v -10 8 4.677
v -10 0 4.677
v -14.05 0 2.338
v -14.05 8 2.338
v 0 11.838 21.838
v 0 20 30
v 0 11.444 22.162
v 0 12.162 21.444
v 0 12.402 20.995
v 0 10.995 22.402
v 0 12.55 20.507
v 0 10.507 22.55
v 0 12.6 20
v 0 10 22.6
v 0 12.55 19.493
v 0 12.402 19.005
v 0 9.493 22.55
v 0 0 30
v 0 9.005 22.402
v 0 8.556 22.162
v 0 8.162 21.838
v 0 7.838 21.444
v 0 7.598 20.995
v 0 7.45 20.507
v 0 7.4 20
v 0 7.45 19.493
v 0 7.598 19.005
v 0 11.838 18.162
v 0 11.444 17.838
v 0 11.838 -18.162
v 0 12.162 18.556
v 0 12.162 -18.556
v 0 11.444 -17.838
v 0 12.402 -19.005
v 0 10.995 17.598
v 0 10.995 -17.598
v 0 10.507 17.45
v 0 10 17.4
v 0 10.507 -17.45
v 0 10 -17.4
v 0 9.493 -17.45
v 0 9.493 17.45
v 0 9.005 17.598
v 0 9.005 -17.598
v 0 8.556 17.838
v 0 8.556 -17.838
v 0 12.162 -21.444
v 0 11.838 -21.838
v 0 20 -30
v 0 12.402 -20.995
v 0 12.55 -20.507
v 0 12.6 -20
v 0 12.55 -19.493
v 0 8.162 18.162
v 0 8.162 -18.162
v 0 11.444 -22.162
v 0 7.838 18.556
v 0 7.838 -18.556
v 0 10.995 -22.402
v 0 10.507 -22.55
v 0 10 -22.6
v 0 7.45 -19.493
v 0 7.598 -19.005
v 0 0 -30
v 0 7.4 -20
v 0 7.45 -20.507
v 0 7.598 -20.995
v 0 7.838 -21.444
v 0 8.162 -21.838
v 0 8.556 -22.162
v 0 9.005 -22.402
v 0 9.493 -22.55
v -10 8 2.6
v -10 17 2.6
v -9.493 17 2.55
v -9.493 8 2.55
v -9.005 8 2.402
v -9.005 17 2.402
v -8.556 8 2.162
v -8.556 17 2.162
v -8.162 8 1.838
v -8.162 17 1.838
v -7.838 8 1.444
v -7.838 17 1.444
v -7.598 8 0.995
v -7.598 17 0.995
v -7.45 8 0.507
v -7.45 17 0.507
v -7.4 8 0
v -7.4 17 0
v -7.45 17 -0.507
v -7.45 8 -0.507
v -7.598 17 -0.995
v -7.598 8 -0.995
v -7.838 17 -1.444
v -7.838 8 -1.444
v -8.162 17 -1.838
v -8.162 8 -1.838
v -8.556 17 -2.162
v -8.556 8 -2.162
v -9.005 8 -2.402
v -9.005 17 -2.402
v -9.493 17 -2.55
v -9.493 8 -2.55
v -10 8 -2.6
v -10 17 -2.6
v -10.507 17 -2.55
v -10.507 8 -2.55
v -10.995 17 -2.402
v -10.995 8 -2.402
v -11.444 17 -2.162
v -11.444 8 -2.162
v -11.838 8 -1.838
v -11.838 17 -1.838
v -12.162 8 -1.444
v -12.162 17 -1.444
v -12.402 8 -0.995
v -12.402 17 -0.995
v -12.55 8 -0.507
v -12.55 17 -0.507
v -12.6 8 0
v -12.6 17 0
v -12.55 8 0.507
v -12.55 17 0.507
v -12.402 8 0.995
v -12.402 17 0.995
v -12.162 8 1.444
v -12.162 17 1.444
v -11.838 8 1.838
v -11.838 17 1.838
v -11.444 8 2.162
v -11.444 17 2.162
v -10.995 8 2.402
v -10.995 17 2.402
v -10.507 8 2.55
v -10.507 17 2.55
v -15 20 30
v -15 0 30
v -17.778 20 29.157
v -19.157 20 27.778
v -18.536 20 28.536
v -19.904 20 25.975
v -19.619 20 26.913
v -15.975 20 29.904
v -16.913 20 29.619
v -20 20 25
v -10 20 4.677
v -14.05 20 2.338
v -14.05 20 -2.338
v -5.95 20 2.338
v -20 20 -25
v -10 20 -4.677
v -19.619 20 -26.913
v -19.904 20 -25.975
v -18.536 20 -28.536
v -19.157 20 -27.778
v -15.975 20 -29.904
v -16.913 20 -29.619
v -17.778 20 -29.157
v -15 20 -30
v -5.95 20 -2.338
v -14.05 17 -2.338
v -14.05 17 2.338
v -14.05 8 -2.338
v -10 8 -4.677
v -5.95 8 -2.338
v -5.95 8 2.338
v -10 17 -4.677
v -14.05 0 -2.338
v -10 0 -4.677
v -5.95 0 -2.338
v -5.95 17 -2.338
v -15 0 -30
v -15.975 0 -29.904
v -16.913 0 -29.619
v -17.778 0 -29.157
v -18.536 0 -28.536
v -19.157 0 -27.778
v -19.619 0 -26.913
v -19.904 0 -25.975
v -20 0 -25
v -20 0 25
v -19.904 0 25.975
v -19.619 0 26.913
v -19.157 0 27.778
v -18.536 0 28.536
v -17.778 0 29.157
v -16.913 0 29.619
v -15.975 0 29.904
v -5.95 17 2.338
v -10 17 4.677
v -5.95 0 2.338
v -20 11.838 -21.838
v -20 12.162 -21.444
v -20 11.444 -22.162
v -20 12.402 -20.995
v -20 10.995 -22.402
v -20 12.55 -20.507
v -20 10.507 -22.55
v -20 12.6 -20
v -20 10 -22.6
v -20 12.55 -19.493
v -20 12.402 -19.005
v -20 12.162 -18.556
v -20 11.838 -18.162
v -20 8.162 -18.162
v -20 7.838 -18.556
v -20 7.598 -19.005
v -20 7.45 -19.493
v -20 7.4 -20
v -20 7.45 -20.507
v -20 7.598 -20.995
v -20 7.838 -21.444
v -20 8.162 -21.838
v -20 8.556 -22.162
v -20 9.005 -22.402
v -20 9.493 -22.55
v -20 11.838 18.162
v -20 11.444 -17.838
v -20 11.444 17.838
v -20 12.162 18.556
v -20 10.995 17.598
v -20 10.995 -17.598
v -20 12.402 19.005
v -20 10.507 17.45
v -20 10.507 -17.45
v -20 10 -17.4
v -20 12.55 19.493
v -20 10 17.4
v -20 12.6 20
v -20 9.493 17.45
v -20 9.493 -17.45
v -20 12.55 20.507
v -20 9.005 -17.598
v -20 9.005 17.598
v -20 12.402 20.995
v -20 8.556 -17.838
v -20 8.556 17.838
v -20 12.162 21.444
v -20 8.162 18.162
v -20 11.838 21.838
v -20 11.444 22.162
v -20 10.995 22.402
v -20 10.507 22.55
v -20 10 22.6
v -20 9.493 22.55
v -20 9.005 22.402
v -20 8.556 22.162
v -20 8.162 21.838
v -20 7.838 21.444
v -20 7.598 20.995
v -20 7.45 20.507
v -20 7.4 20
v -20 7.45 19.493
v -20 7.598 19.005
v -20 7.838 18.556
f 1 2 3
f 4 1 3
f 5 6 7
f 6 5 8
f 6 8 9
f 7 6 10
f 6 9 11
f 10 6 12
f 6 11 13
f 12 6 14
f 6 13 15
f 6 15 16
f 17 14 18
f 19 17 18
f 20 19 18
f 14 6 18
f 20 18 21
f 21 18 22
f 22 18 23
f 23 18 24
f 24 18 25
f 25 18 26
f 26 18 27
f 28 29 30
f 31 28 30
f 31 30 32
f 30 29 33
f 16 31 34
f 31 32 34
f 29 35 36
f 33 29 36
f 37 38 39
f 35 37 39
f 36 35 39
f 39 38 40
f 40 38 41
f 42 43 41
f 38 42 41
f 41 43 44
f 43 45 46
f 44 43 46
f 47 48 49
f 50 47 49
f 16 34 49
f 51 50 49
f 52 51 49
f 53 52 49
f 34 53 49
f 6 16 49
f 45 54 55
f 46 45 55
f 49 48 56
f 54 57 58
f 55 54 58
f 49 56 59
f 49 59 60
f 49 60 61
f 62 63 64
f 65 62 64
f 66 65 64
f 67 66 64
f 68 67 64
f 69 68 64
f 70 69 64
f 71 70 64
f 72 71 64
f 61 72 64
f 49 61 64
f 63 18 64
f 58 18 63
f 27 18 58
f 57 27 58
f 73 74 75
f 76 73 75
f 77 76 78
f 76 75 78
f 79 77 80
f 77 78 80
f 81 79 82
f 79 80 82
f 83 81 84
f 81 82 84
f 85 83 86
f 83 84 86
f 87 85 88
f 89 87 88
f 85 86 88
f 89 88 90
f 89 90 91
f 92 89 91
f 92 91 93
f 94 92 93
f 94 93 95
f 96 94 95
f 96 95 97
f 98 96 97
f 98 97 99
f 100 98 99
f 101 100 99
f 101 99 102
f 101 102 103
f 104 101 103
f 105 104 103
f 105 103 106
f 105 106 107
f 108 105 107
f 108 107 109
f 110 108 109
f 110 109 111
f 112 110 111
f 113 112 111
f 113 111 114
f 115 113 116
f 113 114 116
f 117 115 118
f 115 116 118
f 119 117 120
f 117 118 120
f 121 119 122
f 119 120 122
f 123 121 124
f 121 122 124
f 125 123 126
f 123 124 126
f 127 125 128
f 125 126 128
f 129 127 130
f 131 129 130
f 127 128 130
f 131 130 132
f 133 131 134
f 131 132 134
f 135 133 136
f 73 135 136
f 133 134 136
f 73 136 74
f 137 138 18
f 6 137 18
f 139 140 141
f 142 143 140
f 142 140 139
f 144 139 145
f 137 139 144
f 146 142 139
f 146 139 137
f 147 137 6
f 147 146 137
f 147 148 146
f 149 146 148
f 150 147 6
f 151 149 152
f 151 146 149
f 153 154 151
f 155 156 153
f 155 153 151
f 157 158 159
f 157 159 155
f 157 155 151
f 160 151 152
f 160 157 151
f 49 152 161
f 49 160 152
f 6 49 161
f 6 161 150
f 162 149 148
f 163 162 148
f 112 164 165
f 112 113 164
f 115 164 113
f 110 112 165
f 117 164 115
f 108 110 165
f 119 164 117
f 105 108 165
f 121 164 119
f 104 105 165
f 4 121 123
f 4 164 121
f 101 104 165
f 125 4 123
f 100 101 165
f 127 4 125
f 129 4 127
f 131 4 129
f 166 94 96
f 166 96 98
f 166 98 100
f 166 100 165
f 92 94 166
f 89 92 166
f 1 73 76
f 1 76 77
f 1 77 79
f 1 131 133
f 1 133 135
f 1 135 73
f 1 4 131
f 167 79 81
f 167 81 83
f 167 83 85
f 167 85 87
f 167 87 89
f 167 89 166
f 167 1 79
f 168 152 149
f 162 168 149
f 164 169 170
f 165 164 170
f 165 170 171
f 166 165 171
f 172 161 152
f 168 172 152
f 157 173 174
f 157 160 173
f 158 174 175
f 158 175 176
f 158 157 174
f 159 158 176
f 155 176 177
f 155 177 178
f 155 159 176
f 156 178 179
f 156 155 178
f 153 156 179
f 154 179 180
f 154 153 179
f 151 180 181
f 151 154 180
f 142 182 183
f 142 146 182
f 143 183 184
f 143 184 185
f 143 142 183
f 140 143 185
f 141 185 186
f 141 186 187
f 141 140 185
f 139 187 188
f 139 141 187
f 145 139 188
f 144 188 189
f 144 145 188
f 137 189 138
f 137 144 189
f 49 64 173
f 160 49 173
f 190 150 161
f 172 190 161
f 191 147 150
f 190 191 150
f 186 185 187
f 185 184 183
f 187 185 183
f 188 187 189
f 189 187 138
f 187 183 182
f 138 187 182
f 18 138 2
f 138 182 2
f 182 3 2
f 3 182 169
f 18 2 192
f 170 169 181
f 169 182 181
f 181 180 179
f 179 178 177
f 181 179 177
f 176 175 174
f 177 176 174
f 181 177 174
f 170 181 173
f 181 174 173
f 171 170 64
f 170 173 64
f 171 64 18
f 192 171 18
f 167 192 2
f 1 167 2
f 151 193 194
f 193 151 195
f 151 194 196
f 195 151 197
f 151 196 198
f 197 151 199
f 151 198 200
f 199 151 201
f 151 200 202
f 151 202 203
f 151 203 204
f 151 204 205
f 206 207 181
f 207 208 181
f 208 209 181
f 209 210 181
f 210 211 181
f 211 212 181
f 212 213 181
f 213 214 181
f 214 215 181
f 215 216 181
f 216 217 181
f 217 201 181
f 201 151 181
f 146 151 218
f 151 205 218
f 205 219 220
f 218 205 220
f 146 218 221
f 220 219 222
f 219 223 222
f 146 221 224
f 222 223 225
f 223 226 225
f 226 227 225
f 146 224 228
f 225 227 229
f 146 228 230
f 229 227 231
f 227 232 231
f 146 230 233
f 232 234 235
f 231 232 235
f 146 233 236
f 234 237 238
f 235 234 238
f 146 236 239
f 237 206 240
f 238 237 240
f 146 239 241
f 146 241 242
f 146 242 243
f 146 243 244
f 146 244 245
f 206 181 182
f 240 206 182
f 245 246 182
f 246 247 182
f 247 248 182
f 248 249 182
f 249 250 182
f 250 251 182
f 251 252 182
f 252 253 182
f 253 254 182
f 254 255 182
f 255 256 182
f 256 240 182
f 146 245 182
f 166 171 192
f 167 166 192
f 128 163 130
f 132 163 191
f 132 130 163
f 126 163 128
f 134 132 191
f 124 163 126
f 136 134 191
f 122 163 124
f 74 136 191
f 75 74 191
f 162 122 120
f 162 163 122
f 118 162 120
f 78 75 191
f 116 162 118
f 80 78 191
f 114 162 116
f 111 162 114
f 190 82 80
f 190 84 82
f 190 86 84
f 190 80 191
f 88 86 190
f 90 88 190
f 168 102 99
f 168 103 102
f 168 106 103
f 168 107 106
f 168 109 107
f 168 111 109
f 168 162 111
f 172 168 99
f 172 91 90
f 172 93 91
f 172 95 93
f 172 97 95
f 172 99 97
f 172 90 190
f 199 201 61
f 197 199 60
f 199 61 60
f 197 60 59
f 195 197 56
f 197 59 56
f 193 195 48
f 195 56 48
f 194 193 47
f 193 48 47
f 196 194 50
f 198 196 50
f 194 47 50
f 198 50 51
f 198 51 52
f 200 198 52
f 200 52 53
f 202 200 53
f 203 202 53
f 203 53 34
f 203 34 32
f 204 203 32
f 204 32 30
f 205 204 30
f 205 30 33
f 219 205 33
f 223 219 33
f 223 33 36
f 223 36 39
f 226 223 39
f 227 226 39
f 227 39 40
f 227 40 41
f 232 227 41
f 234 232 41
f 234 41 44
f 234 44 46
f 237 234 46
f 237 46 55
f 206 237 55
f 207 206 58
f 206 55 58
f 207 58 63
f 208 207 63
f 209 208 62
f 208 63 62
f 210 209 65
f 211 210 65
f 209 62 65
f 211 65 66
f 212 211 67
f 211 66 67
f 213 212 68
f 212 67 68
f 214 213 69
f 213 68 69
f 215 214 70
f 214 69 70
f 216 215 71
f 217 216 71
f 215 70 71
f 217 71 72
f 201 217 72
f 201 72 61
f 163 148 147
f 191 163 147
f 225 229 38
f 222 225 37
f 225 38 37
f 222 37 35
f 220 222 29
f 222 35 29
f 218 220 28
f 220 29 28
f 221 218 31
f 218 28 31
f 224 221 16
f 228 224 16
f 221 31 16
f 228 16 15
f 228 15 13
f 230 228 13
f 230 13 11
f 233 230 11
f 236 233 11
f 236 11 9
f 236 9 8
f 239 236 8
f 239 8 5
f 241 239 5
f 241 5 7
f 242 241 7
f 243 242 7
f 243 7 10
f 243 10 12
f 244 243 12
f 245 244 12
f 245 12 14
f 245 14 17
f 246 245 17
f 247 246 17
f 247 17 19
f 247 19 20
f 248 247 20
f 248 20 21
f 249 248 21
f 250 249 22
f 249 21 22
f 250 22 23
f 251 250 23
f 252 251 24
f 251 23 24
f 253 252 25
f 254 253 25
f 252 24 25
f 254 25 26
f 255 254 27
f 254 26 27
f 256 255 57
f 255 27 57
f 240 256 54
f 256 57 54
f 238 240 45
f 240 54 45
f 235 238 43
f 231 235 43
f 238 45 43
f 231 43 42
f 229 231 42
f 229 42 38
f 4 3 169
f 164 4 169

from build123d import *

# Parameters (mm, degrees)
BOSS_EXTRUDE1_DEPTH = 20
SKETCH4_R           = 2.6
CUT_EXTRUDE1_DEPTH  = 42.231056256
CUT_EXTRUDE2_DEPTH  = 3
CUT_EXTRUDE3_DEPTH  = 8
SKETCH7_R           = 2.6
CUT_EXTRUDE4_DEPTH  = 42.231056256
FILLET1_R           = 5


with BuildPart() as part:
    # Sketch1 → Boss-Extrude1 (new body)
    with BuildSketch(Plane(origin=(0, 0, 0), x_dir=(1, 0, 0), z_dir=(0, 1, 0))):
        Polygon((0, 0), (0, 30), (-20, 30), (-20, -30), (0, -30), align=None)
    extrude(amount=BOSS_EXTRUDE1_DEPTH)

    # Sketch4 → Cut-Extrude1 (cut, through all)
    with BuildSketch(Plane(origin=(0, 20, 0), x_dir=(1, 0, 0), z_dir=(0, 1, 0))):
        with Locations(Location((-10, 0, 0), (0, 0, 270))):
            Circle(SKETCH4_R)
    extrude(amount=-CUT_EXTRUDE1_DEPTH, mode=Mode.SUBTRACT)

    # Sketch5 → Cut-Extrude2 (cut)
    with BuildSketch(Plane(origin=(0, 20, 0), x_dir=(1, 0, 0), z_dir=(0, 1, 0))):
        Polygon((-10, 4.67653718), (-14.05, 2.33826859), (-14.05, -2.33826859), (-10, -4.67653718), (-5.95, -2.33826859), (-5.95, 2.33826859), align=None)
    extrude(amount=-CUT_EXTRUDE2_DEPTH, mode=Mode.SUBTRACT)

    # Sketch6 → Cut-Extrude3 (cut)
    with BuildSketch(Plane.XZ):
        Polygon((-10, -4.67653718), (-5.95, -2.33826859), (-5.95, 2.33826859), (-10, 4.67653718), (-14.05, 2.33826859), (-14.05, -2.33826859), align=None)
    extrude(amount=-CUT_EXTRUDE3_DEPTH, mode=Mode.SUBTRACT)

    # Sketch7 → Cut-Extrude4 (cut, through all)
    with BuildSketch(Plane(origin=(0, 0, 0), x_dir=(0, 0, -1), z_dir=(1, 0, 0))):
        with Locations((-20, 10)):
            Circle(SKETCH7_R)
        with Locations((20, 10)):
            Circle(SKETCH7_R)
    extrude(amount=-CUT_EXTRUDE4_DEPTH, mode=Mode.SUBTRACT)

    # Fillet1
    fillet1_edges = [part.edges().sort_by_distance(p)[0] for p in [
        (-20, 10, 30),
        (-20, 10, -30),
    ]]
    fillet(fillet1_edges, radius=FILLET1_R)


solid = part.part
